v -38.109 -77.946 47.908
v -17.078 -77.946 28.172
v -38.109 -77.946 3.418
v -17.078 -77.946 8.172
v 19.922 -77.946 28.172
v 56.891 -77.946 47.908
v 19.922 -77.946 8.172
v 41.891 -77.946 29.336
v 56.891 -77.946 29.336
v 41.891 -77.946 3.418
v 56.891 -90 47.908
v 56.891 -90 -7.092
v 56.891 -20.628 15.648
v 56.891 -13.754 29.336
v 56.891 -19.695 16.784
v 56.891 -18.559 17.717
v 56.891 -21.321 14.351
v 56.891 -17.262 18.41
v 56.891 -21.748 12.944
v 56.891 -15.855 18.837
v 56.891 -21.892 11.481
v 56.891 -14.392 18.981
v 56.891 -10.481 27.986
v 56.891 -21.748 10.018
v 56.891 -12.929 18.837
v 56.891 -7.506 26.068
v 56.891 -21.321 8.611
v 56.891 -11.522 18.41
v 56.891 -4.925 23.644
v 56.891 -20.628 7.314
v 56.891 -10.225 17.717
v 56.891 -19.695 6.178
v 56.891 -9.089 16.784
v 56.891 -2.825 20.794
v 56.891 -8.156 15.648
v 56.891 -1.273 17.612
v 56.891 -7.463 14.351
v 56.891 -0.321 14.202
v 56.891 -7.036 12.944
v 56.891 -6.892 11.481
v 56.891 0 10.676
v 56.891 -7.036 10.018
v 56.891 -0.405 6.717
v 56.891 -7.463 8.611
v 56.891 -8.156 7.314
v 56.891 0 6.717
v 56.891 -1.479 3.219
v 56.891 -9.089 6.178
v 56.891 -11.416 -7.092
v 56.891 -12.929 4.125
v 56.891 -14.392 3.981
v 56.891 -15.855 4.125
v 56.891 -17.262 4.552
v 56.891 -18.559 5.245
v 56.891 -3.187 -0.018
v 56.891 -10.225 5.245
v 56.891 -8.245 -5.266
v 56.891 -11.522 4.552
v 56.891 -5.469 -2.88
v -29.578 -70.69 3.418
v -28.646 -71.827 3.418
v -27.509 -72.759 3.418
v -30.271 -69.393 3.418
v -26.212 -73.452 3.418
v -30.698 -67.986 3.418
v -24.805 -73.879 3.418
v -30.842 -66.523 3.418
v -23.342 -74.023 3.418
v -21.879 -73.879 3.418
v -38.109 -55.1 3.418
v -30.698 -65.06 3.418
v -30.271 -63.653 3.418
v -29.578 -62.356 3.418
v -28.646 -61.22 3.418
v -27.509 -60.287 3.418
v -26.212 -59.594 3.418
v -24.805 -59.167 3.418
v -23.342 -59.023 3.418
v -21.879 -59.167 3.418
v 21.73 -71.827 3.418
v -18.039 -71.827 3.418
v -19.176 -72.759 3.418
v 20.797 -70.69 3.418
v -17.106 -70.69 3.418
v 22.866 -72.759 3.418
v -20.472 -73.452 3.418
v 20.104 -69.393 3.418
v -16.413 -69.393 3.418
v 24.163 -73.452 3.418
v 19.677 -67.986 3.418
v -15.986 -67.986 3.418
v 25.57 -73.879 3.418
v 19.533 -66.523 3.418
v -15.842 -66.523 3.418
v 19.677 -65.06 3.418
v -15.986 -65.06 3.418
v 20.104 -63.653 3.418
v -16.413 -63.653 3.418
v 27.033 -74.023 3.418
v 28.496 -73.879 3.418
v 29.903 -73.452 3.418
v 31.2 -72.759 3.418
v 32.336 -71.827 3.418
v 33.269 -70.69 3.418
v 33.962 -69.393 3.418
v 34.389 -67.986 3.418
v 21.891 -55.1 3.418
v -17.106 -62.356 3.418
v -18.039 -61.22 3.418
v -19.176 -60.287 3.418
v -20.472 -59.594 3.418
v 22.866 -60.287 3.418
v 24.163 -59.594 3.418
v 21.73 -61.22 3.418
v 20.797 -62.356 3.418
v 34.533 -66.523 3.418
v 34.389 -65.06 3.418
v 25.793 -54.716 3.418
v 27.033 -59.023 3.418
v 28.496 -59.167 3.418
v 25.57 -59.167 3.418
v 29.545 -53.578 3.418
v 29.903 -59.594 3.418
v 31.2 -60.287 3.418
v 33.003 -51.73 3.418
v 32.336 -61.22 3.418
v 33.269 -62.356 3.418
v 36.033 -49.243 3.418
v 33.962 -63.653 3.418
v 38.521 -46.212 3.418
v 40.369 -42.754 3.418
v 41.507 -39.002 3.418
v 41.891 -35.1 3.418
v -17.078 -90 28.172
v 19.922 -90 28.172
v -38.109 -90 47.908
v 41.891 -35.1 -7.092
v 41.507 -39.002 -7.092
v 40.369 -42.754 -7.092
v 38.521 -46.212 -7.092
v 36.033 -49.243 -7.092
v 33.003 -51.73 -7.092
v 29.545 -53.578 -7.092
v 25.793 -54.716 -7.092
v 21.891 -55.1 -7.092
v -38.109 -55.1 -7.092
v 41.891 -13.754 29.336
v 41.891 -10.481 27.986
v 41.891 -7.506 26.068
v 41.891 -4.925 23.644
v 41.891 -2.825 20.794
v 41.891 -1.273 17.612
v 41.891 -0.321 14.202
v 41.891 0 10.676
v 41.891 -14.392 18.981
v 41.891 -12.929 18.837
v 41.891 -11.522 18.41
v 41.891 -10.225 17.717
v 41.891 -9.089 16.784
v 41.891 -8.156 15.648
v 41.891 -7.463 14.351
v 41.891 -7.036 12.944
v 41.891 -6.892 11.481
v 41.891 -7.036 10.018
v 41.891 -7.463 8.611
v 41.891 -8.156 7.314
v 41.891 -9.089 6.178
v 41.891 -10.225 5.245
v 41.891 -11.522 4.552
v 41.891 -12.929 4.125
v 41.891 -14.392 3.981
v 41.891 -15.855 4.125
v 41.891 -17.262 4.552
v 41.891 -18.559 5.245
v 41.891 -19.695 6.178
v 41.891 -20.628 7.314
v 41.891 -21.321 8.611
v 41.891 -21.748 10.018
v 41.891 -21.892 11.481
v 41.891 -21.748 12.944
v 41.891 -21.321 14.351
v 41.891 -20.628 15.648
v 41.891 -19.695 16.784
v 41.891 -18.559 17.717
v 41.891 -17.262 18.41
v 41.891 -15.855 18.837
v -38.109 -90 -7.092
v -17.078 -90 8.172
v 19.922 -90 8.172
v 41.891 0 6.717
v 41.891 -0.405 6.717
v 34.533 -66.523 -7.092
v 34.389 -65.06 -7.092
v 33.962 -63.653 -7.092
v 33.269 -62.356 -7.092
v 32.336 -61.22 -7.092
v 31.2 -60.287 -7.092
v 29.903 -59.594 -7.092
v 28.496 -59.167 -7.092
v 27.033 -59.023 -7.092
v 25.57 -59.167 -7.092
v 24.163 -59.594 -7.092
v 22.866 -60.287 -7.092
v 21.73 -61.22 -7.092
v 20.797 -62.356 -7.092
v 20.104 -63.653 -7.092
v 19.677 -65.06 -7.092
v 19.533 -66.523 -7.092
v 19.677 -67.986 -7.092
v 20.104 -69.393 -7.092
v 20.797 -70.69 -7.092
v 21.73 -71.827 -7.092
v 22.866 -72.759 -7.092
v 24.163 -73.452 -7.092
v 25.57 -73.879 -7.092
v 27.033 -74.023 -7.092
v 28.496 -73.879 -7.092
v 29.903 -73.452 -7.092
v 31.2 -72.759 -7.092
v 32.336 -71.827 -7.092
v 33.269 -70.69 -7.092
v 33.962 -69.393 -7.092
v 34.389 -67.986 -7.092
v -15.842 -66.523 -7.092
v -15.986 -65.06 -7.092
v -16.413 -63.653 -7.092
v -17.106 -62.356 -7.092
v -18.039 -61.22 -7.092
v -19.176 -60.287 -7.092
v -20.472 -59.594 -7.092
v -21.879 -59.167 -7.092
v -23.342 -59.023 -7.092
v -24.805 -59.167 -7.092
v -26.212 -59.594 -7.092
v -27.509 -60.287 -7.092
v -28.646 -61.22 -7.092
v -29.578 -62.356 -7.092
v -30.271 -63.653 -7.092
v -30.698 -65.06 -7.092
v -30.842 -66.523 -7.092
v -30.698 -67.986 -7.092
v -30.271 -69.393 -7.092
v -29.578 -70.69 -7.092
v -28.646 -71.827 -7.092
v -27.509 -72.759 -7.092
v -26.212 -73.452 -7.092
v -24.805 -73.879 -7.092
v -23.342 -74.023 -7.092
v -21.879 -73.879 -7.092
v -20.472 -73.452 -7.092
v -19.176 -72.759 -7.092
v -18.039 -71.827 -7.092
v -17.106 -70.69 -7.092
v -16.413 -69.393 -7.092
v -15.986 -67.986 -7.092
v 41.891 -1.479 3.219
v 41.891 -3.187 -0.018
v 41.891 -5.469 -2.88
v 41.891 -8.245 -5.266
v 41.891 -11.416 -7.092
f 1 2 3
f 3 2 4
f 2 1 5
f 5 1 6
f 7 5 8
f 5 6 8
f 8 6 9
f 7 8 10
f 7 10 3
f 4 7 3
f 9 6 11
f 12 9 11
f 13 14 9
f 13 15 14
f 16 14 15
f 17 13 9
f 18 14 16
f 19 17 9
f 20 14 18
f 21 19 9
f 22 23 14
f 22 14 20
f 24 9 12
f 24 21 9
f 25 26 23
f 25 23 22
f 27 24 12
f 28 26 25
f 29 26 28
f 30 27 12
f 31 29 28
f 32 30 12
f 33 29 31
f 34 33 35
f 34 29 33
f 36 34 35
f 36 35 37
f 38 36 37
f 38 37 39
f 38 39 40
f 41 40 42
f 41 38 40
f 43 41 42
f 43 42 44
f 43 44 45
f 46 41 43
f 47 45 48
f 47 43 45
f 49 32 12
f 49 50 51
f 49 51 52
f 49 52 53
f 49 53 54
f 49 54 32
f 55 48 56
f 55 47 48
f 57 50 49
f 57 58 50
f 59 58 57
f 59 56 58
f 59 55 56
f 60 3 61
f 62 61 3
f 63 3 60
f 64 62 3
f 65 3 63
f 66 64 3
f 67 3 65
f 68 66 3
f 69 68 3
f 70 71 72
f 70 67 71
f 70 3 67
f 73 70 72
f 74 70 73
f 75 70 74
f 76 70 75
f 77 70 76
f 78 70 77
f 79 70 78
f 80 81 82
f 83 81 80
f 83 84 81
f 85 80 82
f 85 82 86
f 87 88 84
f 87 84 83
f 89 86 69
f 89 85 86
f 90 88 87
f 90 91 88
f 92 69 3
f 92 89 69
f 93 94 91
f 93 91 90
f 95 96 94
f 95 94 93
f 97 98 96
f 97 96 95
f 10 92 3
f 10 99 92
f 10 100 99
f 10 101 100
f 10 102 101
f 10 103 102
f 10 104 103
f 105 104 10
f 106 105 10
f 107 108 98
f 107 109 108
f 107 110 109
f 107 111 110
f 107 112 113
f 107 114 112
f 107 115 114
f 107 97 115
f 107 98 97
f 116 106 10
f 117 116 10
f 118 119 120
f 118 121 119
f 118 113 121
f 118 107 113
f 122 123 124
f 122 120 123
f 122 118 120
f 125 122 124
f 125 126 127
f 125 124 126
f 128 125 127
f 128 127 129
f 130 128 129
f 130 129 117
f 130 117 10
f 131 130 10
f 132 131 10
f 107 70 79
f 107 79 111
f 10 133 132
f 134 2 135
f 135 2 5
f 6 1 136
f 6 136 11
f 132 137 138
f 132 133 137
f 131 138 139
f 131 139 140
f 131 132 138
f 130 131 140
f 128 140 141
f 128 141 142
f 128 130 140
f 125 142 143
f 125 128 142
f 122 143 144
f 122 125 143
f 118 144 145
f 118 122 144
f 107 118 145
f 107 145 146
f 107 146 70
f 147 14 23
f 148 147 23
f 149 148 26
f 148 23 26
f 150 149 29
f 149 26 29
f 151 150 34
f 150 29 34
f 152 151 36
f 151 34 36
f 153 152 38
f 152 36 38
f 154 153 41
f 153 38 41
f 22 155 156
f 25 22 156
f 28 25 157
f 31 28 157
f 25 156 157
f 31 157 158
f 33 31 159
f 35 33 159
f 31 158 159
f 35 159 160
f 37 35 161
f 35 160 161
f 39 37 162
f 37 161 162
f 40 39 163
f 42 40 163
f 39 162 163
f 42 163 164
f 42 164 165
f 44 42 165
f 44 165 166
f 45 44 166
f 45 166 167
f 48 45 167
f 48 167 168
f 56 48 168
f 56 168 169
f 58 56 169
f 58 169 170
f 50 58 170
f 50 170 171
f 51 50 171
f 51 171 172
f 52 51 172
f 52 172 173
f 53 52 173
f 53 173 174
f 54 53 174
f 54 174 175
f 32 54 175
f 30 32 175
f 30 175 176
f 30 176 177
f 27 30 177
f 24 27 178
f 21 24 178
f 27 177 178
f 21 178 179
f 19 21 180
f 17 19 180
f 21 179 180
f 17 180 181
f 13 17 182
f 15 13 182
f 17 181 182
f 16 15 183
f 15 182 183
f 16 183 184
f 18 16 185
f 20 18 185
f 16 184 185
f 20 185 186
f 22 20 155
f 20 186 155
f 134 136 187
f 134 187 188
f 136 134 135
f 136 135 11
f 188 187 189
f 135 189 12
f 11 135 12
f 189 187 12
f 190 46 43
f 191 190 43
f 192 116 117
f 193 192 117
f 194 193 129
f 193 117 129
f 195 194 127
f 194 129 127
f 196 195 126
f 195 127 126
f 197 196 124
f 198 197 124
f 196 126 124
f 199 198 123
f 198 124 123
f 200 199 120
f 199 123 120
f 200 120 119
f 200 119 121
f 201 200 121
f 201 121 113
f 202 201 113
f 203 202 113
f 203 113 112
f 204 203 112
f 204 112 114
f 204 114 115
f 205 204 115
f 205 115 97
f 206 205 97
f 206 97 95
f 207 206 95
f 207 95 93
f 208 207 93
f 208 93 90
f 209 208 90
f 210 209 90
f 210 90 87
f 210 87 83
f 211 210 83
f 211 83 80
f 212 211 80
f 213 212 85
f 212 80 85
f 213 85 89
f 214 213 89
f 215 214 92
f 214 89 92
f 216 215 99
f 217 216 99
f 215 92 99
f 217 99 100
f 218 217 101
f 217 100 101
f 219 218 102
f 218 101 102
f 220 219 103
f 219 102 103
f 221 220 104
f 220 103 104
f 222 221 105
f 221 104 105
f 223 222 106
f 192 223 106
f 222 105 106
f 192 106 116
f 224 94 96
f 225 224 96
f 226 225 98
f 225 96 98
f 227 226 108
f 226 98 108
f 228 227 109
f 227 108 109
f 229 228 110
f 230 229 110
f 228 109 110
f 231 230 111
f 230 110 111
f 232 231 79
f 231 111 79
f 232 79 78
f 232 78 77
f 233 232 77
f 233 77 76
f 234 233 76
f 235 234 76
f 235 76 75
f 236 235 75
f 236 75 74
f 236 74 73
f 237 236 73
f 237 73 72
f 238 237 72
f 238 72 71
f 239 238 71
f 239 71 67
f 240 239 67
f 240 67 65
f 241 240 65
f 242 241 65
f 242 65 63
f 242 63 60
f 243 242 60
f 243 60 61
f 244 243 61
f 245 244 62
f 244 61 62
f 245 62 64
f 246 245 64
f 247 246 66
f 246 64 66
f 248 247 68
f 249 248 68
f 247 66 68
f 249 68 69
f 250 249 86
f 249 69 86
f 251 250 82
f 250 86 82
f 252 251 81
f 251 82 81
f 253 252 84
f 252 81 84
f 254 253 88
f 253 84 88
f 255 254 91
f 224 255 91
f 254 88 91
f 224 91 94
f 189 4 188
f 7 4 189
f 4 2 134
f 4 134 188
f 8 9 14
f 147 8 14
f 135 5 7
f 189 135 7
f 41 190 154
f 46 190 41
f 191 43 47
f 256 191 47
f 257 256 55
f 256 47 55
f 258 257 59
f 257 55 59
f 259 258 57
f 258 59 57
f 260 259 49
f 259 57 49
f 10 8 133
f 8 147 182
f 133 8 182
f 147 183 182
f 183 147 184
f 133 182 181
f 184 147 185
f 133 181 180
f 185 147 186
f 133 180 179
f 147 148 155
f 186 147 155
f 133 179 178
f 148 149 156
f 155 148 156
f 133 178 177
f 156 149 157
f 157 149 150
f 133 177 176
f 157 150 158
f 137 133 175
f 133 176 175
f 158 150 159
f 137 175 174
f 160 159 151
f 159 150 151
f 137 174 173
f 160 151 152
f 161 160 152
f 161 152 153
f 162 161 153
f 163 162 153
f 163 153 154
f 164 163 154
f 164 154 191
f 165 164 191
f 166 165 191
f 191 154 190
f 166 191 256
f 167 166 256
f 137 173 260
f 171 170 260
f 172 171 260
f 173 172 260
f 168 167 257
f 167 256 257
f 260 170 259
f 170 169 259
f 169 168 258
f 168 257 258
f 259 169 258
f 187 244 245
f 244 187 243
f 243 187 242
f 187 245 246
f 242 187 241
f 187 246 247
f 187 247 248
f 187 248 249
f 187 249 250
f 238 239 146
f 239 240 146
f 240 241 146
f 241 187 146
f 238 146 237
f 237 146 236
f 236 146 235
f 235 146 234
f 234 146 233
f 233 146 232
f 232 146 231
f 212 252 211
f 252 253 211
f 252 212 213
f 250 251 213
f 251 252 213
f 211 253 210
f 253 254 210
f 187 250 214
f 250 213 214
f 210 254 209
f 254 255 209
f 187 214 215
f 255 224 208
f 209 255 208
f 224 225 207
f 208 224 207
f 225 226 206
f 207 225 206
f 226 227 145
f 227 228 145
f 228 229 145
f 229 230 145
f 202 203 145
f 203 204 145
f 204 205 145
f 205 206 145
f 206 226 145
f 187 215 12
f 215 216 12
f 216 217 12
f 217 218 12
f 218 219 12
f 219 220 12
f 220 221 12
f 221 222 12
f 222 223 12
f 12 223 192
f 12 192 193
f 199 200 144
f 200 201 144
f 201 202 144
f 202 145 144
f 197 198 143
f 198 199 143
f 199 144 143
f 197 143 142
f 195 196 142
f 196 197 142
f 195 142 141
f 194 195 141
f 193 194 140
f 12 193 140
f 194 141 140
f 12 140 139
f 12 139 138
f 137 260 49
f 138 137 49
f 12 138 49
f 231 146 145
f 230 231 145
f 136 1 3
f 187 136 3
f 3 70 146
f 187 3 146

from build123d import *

# Parameters (mm, degrees)
SKETCH9_W           = 95
SKETCH9_H           = 55
BOSS_EXTRUDE1_DEPTH = 90
CUT_EXTRUDE5_DEPTH  = 100
SKETCH12_W          = 60.486878253
SKETCH12_H          = 73.853608548
CUT_EXTRUDE7_DEPTH  = 80
SKETCH13_W          = 80
SKETCH13_H          = 25.917714192
CUT_EXTRUDE8_DEPTH  = 22.845479
FILLET1_R           = 20
SKETCH16_R          = 7.5
CUT_EXTRUDE9_DEPTH  = 30
SKETCH17_W          = 37
SKETCH17_H          = 20
CUT_EXTRUDE10_DEPTH = 30
SKETCH18_R          = 7.5
CUT_EXTRUDE11_DEPTH = 30


with BuildPart() as part:
    # Sketch9 → Boss-Extrude1 (new body)
    with BuildSketch(Plane(origin=(0, 0, 0), x_dir=(1, 0, 0), z_dir=(0, 1, 0))):
        with Locations((9.391117479, -20.408309456)):
            Rectangle(SKETCH9_W, SKETCH9_H)
    extrude(amount=-BOSS_EXTRUDE1_DEPTH)

    # Sketch10 → Cut-Extrude5 (cut)
    with BuildSketch(Plane(origin=(56.891117479, 0, 0), x_dir=(0, 0, -1), z_dir=(1, 0, 0))):
        with BuildLine():
            ThreePointArc((-6.717440326, -0.405285552), (1.502612431, -4.261054452), (7.091690544, -11.416362061))
            Line((7.091690544, -11.416362061), (7.091690544, 0))
            Line((7.091690544, 0), (-6.717440326, 0))
            Line((-6.717440326, 0), (-6.717440326, -0.405285552))
        make_face()
        with BuildLine():
            Line((-47.908309456, -77.945973927), (-29.335605617, -77.945973927))
            Line((-29.335605617, -77.945973927), (-29.335605617, -13.754463437))
            ThreePointArc((-29.335605617, -13.754463437), (-22.266542801, -3.810210472), (-10.675938318, 0))
            Line((-10.675938318, 0), (-47.908309456, 0))
            Line((-47.908309456, 0), (-47.908309456, -77.945973927))
        make_face()
    extrude(amount=-CUT_EXTRUDE5_DEPTH, mode=Mode.SUBTRACT)

    # Sketch12 → Cut-Extrude7 (cut)
    with BuildSketch(Plane.ZY.offset(38.108882521)):
        with Locations((7.902207673, -18.173690635)):
            Rectangle(SKETCH12_W, SKETCH12_H)
    extrude(amount=-CUT_EXTRUDE7_DEPTH, mode=Mode.SUBTRACT)

    # Sketch13 → Cut-Extrude8 (cut)
    with BuildSketch(Plane(origin=(0, -55.100494909, 0), x_dir=(1, 0, 0), z_dir=(0, 1, 0))):
        with Locations((1.891117479, -16.376748521)):
            Rectangle(SKETCH13_W, SKETCH13_H)
    extrude(amount=-CUT_EXTRUDE8_DEPTH, mode=Mode.SUBTRACT)

    # Fillet1
    fillet1_edges = [part.edges().sort_by_distance(p)[0] for p in [
        (41.891117479, -55.100494909, -1.836899559),
    ]]
    fillet(fillet1_edges, radius=FILLET1_R)

    # Sketch16 → Cut-Extrude9 (cut)
    with BuildSketch(Plane.XY.offset(3.417891425)):
        with Locations((-23.342301778, -66.523234418)):
            Circle(SKETCH16_R)
        with Locations((27.03315513, -66.523234418)):
            Circle(SKETCH16_R)
    extrude(amount=-CUT_EXTRUDE9_DEPTH, mode=Mode.SUBTRACT)

    # Sketch17 → Cut-Extrude10 (cut)
    with BuildSketch(Plane(origin=(0, -77.945973927, 0), x_dir=(1, 0, 0), z_dir=(0, 1, 0))):
        with Locations((1.421785082, -18.172095262)):
            Rectangle(SKETCH17_W, SKETCH17_H)
    extrude(amount=-CUT_EXTRUDE10_DEPTH, mode=Mode.SUBTRACT)

    # Sketch18 → Cut-Extrude11 (cut)
    with BuildSketch(Plane.ZY.offset(-41.891117479)):
        with Locations((11.481013295, -14.392127448)):
            Circle(SKETCH18_R)
    extrude(amount=-CUT_EXTRUDE11_DEPTH, mode=Mode.SUBTRACT)


solid = part.part
